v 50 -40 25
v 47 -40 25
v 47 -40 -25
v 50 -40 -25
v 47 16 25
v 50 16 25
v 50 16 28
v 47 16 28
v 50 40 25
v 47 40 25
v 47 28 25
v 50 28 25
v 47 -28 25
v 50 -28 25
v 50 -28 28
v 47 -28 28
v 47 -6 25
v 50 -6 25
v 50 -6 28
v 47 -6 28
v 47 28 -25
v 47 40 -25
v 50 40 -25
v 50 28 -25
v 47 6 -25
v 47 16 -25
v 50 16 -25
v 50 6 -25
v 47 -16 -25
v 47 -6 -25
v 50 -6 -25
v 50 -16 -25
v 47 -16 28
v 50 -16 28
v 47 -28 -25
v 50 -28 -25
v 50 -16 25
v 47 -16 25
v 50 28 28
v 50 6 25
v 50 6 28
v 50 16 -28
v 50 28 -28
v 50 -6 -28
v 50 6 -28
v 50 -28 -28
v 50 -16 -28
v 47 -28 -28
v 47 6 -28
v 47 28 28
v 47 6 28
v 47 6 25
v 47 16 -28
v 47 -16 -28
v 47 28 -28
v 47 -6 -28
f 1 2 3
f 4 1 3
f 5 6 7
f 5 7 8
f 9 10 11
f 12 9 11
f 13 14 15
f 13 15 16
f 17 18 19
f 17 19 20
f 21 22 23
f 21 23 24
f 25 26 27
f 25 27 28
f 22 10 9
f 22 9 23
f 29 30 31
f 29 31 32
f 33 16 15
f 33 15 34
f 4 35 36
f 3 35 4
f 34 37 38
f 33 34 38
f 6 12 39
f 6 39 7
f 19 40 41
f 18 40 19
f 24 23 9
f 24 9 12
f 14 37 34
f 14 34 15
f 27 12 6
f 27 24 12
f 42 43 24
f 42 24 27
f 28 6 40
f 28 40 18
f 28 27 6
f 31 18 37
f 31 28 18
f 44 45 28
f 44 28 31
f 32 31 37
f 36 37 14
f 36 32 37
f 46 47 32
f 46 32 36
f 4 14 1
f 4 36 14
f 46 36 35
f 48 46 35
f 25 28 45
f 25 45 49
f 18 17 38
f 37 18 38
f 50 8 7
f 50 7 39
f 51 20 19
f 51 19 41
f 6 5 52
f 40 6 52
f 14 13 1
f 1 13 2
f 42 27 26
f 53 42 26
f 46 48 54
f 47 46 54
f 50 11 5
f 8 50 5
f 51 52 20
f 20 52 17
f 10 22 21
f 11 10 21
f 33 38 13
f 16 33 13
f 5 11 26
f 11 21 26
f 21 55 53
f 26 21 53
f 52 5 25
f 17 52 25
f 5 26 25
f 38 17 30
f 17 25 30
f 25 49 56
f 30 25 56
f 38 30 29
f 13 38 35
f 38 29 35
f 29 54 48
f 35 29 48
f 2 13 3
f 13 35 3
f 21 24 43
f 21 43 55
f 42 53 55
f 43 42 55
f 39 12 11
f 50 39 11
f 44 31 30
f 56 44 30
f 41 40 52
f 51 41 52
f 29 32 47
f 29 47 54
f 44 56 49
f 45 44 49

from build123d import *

# Parameters (mm, degrees)
BINDER_W                = 80
BINDER_H                = 50
PAD_DEPTH               = 3
BINDER001_W             = 12
BINDER001_H             = 3
PAD001_DEPTH            = 3
BINDER001_MIRRORED_2_W  = 12
BINDER001_MIRRORED_2_H  = 3
PAD001_MIRRORED_2_DEPTH = 3
LINEARPATTERN_COUNT     = 3
LINEARPATTERN_PITCH     = 22


with BuildPart() as part:
    # Binder → Pad (new body)
    with BuildSketch(Plane(origin=(47, 0, 0), x_dir=(0, -1, 0), z_dir=(1, 0, 0))):
        Rectangle(BINDER_W, BINDER_H)
    extrude(amount=PAD_DEPTH)

    # Binder001 → Pad001 (join)
    with BuildSketch(Plane(origin=(48.5, -22, 25), x_dir=(0, 1, 0), z_dir=(0, 0, 1))):
        Rectangle(BINDER001_W, BINDER001_H)
    pad001 = extrude(amount=PAD001_DEPTH)

    # Binder001 Mirrored 2 → Pad001 Mirrored 2 (add)
    with BuildSketch(Plane(origin=(48.5, -22, -25), x_dir=(0, 1, 0), z_dir=(0, 0, 1))):
        Rectangle(BINDER001_MIRRORED_2_W, BINDER001_MIRRORED_2_H)
    pad001_mirrored_2 = extrude(amount=-PAD001_MIRRORED_2_DEPTH)

    # LinearPattern: Pad001, Pad001 Mirrored 2 ×3
    with Locations(*[(0, i * LINEARPATTERN_PITCH, 0) for i in range(1, LINEARPATTERN_COUNT)]):
        add(pad001)
        add(pad001_mirrored_2)


solid = part.part
